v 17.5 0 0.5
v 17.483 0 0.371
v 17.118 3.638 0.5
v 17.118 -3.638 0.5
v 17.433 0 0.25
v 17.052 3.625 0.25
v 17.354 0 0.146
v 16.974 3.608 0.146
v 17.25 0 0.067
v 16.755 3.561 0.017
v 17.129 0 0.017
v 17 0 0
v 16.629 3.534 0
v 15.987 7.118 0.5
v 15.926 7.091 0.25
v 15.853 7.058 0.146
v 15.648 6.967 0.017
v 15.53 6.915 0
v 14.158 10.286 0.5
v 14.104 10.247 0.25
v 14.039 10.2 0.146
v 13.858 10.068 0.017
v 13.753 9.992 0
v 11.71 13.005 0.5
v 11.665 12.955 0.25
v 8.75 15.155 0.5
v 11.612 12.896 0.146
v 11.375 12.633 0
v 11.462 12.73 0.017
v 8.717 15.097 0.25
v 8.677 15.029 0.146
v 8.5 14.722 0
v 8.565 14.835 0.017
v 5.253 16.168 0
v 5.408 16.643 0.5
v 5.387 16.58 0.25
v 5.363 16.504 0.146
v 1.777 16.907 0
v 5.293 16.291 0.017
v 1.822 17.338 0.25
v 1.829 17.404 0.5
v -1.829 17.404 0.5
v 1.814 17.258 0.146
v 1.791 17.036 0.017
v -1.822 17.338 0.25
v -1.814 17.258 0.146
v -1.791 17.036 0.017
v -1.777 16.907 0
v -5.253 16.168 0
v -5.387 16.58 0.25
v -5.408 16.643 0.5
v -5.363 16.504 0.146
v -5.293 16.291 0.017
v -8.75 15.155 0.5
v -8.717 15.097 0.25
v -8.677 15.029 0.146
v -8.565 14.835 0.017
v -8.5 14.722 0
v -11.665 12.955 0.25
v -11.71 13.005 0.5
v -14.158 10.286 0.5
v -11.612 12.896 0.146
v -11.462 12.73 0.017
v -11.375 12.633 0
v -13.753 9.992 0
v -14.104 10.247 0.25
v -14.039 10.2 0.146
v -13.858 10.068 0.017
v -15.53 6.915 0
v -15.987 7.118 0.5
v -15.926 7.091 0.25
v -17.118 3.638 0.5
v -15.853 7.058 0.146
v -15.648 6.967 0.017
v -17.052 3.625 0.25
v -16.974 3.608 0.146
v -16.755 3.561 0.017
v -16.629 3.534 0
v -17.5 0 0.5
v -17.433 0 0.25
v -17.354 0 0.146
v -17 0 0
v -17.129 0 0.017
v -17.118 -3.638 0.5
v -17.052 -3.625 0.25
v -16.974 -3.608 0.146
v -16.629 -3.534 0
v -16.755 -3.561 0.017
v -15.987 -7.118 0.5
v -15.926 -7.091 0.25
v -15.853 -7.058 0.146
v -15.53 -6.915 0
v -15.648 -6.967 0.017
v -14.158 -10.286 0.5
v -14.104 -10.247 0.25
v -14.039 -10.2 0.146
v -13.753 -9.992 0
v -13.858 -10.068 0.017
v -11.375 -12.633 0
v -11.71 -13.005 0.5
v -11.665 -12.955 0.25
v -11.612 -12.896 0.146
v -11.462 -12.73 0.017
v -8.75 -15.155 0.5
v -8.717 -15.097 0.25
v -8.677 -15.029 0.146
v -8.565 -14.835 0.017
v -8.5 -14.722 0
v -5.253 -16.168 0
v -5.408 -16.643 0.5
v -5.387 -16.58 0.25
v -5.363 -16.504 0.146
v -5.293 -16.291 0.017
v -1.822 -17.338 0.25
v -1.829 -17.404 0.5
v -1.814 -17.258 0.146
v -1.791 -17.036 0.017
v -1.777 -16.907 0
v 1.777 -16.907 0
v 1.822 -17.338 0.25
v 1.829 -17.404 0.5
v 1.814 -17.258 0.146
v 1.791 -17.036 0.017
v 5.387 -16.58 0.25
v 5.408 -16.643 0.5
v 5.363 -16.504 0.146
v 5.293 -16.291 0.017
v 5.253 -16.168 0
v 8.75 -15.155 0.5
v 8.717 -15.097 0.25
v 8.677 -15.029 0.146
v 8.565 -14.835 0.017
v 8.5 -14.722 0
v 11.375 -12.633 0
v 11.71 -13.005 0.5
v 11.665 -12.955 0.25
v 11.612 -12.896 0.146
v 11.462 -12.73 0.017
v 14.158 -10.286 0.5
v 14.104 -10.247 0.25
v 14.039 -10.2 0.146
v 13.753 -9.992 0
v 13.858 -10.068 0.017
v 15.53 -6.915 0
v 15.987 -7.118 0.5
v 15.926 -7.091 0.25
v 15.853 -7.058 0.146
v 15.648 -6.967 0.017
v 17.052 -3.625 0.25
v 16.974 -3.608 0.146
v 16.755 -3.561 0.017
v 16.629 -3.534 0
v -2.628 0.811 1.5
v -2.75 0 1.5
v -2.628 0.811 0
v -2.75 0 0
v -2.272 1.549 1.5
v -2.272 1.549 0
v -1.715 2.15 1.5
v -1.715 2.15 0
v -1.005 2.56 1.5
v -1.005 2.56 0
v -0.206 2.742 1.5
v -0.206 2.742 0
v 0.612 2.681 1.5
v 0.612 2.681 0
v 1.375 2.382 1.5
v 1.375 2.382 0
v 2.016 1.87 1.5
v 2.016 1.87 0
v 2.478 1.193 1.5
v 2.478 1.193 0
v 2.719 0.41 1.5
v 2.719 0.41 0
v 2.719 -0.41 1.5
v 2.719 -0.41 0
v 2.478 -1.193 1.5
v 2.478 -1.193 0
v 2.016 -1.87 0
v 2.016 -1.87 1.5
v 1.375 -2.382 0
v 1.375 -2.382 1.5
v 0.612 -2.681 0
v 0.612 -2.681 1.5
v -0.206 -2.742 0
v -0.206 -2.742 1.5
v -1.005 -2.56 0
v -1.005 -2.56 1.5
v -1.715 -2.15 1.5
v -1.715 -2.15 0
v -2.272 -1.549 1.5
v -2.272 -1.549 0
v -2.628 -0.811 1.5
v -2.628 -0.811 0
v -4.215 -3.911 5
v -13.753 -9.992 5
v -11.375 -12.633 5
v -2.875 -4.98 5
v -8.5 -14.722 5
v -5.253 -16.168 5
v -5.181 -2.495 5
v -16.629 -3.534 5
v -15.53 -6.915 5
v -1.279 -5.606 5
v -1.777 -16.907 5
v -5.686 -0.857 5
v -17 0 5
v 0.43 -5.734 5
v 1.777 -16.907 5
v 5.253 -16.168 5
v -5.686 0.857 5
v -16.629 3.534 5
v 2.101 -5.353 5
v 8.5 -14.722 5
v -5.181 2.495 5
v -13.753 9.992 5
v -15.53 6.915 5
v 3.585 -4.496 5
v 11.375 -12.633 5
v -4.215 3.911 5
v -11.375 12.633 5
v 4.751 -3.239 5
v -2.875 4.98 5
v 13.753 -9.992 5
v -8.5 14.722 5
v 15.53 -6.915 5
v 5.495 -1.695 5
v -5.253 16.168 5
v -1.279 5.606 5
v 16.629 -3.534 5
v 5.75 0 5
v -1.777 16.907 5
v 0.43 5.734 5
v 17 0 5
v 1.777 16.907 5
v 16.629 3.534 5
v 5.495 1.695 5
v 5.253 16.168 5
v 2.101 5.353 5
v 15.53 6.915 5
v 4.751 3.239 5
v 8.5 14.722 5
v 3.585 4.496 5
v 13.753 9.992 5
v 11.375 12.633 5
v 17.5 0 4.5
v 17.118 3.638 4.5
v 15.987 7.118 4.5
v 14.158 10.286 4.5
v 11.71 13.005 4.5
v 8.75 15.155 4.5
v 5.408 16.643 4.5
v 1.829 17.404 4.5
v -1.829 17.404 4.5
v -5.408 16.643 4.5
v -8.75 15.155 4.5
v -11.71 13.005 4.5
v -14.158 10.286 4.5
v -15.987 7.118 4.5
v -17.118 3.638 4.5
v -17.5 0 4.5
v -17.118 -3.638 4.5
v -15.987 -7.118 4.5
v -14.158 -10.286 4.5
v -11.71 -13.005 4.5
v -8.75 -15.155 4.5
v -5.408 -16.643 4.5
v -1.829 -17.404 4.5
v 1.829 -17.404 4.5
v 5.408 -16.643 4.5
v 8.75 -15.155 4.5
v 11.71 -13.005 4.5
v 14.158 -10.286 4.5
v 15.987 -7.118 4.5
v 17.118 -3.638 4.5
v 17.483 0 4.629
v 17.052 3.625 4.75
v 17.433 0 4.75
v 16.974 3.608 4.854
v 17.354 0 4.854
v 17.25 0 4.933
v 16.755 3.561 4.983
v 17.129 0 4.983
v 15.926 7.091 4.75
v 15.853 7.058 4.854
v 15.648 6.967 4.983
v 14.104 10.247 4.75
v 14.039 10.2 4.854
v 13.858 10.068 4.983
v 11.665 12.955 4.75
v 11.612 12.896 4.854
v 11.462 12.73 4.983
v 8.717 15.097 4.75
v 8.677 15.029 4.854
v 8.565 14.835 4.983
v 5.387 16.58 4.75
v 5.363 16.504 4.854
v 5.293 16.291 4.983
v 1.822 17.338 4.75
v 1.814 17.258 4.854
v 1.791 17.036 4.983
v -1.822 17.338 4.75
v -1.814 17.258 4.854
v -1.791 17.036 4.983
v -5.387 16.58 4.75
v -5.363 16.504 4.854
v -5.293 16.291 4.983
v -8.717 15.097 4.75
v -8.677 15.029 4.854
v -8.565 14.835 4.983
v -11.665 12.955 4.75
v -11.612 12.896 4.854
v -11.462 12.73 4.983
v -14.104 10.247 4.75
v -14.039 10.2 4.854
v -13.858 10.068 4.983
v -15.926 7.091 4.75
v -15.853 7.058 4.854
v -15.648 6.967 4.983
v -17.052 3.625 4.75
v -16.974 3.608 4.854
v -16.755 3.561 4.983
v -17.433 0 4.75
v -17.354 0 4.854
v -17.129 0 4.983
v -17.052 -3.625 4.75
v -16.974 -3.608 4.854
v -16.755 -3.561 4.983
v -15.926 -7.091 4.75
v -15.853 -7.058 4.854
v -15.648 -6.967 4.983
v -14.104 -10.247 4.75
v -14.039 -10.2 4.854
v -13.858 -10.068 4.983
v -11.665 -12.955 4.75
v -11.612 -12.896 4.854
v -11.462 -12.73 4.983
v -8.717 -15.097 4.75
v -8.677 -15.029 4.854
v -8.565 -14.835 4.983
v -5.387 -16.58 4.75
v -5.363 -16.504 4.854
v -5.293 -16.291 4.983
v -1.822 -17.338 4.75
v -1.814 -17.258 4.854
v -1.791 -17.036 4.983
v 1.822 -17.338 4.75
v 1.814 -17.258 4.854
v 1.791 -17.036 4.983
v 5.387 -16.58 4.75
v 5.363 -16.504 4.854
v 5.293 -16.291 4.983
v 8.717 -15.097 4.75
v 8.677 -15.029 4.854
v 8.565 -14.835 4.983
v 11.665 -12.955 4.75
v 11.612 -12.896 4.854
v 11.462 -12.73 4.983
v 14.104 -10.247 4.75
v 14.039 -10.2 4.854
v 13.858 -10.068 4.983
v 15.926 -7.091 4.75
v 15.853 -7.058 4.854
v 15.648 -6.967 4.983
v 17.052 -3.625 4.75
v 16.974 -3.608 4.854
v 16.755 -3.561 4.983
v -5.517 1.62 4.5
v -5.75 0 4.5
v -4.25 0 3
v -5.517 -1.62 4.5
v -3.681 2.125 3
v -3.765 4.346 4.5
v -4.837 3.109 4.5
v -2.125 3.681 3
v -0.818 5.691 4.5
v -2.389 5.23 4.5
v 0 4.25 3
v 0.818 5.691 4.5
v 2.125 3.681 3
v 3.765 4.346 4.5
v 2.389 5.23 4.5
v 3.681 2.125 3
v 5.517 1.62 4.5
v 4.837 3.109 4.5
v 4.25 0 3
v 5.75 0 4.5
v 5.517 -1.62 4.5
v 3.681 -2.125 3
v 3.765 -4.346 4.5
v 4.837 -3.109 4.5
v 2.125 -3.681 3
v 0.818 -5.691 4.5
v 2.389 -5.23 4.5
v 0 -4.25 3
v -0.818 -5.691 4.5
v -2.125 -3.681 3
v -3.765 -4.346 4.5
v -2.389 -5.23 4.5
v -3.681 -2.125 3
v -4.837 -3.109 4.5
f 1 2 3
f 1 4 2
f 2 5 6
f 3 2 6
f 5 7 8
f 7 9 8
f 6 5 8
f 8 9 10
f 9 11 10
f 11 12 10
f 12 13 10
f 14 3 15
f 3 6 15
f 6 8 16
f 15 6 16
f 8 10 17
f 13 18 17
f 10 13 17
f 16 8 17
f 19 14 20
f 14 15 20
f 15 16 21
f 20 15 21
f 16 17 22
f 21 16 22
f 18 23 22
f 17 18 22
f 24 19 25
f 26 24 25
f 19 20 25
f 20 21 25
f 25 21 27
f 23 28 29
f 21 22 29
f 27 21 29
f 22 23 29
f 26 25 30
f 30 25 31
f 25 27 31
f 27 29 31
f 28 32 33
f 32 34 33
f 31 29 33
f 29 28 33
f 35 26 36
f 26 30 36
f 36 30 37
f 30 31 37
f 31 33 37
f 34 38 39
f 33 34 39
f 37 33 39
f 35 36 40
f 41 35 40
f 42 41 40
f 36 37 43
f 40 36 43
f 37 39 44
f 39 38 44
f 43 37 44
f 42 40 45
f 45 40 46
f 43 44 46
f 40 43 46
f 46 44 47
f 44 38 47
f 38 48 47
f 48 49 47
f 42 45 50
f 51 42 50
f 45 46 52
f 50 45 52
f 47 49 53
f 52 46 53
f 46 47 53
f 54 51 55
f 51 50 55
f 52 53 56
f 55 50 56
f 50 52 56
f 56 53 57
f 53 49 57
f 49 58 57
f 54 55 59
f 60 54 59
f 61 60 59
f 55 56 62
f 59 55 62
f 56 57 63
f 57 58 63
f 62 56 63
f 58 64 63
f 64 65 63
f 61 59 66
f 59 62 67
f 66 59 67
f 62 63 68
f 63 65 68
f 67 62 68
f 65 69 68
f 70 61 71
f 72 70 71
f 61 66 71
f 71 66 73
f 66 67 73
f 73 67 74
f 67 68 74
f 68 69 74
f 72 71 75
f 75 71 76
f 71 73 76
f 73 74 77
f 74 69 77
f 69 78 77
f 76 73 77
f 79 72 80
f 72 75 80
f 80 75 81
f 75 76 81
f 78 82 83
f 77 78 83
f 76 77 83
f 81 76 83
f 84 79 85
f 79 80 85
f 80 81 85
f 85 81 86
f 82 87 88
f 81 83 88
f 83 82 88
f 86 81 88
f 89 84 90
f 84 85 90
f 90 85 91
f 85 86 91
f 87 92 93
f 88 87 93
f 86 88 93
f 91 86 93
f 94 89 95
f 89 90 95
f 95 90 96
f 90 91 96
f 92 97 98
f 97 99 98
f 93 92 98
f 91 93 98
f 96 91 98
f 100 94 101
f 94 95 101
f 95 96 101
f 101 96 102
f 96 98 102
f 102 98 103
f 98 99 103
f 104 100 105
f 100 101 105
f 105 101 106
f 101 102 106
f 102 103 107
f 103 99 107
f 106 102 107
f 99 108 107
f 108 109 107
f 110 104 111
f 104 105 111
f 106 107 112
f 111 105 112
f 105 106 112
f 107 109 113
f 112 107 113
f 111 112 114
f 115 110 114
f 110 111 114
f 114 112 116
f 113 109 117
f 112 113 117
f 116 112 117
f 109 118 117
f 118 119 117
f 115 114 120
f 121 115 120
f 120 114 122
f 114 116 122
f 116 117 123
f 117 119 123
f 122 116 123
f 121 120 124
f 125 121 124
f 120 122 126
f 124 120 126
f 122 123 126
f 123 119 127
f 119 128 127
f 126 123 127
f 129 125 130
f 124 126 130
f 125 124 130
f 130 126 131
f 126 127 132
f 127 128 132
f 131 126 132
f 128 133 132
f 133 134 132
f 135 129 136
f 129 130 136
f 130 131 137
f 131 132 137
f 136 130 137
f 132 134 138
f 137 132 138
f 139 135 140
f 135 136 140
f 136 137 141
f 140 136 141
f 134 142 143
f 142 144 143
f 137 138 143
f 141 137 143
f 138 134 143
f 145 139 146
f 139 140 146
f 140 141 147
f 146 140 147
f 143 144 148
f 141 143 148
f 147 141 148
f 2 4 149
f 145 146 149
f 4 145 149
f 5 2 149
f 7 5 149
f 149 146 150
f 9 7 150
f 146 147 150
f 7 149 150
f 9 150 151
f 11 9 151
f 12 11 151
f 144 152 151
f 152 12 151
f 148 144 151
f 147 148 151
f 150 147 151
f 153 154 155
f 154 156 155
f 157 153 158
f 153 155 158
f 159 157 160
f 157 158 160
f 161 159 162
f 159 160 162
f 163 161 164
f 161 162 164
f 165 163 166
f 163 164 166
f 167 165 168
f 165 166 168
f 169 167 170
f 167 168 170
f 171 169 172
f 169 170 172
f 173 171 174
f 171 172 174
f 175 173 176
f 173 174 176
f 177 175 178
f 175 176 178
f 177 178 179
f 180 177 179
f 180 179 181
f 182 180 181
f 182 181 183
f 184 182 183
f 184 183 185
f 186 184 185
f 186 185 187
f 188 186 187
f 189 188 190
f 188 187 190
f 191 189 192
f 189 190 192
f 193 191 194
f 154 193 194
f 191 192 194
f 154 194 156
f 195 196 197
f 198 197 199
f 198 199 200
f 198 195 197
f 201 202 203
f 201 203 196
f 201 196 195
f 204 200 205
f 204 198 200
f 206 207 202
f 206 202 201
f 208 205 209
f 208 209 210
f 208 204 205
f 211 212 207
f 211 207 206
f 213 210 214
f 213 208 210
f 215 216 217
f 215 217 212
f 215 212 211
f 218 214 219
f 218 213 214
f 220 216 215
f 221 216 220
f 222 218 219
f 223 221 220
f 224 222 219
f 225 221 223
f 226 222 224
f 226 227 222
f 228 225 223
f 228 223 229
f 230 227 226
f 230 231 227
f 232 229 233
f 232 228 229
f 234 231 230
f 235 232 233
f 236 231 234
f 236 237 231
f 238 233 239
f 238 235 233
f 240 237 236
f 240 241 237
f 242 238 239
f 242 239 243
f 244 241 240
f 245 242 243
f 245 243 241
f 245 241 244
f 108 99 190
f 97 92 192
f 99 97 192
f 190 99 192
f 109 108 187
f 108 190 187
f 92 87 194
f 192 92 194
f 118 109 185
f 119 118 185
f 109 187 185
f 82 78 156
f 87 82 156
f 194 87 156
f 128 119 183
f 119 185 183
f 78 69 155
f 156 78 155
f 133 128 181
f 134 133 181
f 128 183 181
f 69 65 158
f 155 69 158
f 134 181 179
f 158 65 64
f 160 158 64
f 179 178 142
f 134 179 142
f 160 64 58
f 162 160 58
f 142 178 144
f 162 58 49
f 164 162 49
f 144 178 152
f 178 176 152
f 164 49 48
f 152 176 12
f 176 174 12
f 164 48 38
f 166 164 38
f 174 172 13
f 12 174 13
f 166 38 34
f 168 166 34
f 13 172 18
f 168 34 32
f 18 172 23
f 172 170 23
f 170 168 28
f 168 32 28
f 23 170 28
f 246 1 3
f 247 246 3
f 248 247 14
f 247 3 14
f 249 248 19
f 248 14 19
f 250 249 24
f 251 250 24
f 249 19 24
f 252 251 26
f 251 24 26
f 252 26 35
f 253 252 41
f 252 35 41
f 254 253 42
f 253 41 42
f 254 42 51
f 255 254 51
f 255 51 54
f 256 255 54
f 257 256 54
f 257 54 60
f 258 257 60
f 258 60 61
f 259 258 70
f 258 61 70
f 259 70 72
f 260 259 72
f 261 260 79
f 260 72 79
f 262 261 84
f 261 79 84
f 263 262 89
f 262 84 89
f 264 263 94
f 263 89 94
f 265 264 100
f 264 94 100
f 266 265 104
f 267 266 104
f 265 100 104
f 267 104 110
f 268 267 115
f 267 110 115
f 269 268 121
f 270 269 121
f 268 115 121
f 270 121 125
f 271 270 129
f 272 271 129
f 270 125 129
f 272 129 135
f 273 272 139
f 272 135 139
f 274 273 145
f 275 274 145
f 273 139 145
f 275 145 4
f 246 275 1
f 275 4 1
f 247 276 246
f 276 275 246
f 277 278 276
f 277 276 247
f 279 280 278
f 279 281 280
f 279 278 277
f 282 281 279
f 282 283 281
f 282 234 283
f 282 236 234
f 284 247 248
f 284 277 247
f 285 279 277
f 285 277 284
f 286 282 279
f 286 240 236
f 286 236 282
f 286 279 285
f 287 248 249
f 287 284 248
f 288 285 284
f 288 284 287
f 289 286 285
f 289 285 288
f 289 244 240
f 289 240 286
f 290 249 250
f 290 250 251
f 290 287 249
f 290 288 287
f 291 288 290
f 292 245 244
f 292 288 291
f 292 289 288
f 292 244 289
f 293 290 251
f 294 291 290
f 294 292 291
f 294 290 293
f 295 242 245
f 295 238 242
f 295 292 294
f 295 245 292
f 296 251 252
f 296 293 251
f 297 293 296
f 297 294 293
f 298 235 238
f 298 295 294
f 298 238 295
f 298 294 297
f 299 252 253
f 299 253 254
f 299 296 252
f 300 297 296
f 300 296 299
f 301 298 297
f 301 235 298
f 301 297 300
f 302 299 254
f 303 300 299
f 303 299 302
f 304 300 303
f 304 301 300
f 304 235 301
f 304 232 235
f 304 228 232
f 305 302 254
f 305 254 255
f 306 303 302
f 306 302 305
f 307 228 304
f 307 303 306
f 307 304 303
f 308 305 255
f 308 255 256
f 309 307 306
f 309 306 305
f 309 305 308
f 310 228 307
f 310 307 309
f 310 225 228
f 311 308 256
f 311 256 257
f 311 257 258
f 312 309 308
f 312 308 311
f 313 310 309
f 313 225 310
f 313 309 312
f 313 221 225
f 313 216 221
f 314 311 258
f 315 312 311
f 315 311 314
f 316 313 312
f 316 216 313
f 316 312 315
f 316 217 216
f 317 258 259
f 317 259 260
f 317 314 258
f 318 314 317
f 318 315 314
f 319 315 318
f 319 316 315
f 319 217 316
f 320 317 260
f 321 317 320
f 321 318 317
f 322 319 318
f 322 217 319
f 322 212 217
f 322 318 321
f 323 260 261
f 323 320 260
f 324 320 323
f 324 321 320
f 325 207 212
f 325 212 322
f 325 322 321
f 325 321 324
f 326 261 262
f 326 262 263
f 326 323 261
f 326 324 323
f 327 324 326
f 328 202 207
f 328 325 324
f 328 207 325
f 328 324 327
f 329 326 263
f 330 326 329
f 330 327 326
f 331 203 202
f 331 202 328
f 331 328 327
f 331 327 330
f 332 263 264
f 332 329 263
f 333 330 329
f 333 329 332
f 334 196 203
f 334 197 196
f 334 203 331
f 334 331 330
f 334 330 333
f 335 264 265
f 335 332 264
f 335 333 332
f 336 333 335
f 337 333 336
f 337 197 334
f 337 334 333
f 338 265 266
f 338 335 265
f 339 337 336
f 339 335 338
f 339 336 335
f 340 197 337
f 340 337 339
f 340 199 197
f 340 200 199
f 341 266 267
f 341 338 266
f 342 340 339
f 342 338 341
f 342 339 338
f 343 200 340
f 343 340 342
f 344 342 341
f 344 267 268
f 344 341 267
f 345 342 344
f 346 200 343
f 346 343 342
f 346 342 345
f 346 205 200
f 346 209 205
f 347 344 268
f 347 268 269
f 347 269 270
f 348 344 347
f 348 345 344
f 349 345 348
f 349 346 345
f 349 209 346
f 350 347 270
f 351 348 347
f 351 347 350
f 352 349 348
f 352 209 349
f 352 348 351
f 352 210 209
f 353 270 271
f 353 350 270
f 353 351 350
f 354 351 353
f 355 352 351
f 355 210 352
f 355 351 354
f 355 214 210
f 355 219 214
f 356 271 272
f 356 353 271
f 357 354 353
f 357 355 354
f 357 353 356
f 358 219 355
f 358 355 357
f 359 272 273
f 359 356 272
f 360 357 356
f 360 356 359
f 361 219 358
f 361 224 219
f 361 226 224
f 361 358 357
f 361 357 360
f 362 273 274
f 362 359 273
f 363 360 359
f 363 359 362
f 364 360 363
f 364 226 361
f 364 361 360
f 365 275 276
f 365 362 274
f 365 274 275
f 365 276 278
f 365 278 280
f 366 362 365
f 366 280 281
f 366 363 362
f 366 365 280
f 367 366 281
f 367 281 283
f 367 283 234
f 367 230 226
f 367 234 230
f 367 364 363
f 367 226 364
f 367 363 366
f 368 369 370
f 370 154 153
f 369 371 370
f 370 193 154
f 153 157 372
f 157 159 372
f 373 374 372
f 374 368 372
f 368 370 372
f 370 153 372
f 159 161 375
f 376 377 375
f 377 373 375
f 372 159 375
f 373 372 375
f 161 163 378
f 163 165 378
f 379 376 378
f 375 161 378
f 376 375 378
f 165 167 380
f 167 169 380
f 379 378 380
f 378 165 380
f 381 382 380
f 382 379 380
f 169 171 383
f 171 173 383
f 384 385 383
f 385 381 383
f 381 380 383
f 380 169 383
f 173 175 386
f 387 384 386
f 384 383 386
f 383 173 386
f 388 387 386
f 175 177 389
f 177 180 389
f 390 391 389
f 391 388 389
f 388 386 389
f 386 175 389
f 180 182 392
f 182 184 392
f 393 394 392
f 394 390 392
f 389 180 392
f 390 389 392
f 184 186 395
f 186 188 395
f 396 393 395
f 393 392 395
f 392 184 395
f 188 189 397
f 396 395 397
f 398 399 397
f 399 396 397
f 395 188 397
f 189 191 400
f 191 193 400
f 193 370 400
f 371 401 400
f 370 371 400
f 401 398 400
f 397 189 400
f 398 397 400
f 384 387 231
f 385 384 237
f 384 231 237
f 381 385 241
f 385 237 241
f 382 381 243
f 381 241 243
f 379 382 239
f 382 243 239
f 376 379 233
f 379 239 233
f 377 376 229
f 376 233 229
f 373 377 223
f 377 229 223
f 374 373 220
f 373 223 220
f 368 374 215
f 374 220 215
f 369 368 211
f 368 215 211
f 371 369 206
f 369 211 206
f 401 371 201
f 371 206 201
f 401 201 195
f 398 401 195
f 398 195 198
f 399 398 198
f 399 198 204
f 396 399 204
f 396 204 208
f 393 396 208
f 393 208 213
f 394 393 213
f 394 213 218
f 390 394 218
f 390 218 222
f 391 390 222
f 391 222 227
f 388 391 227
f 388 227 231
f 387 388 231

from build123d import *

# Parameters (mm, degrees)
F0_R           = 17.5
F1_DEPTH       = 5
F2_R           = 5.75
F3_DEPTH       = 0.5
F5_D           = 5.5
F5_CSINK_D     = 11.5
F5_CSINK_ANGLE = 90
F6_R           = 0.5


with BuildPart() as f1:
    # F0 (on Top) → F1 (new body)
    with BuildSketch(Plane.XY):
        Circle(F0_R)
    extrude(amount=F1_DEPTH)

    # F2 (on face) → F3 (cut)
    with BuildSketch(Plane.XY.offset(5)):
        Circle(F2_R)
    extrude(amount=-F3_DEPTH, mode=Mode.SUBTRACT)

    # F5 (through all)
    with Locations(Plane.XY.offset(4.5)):
        with Locations((0, 0)):
            CounterSinkHole(F5_D / 2, F5_CSINK_D / 2, counter_sink_angle=F5_CSINK_ANGLE)

    # F6
    f6_edges = [f1.edges().sort_by_distance(p)[0] for p in [
        (-17.5, 0, 5),
        (-17.5, 0, 0),
    ]]
    fillet(f6_edges, radius=F6_R)


solid = f1.part
